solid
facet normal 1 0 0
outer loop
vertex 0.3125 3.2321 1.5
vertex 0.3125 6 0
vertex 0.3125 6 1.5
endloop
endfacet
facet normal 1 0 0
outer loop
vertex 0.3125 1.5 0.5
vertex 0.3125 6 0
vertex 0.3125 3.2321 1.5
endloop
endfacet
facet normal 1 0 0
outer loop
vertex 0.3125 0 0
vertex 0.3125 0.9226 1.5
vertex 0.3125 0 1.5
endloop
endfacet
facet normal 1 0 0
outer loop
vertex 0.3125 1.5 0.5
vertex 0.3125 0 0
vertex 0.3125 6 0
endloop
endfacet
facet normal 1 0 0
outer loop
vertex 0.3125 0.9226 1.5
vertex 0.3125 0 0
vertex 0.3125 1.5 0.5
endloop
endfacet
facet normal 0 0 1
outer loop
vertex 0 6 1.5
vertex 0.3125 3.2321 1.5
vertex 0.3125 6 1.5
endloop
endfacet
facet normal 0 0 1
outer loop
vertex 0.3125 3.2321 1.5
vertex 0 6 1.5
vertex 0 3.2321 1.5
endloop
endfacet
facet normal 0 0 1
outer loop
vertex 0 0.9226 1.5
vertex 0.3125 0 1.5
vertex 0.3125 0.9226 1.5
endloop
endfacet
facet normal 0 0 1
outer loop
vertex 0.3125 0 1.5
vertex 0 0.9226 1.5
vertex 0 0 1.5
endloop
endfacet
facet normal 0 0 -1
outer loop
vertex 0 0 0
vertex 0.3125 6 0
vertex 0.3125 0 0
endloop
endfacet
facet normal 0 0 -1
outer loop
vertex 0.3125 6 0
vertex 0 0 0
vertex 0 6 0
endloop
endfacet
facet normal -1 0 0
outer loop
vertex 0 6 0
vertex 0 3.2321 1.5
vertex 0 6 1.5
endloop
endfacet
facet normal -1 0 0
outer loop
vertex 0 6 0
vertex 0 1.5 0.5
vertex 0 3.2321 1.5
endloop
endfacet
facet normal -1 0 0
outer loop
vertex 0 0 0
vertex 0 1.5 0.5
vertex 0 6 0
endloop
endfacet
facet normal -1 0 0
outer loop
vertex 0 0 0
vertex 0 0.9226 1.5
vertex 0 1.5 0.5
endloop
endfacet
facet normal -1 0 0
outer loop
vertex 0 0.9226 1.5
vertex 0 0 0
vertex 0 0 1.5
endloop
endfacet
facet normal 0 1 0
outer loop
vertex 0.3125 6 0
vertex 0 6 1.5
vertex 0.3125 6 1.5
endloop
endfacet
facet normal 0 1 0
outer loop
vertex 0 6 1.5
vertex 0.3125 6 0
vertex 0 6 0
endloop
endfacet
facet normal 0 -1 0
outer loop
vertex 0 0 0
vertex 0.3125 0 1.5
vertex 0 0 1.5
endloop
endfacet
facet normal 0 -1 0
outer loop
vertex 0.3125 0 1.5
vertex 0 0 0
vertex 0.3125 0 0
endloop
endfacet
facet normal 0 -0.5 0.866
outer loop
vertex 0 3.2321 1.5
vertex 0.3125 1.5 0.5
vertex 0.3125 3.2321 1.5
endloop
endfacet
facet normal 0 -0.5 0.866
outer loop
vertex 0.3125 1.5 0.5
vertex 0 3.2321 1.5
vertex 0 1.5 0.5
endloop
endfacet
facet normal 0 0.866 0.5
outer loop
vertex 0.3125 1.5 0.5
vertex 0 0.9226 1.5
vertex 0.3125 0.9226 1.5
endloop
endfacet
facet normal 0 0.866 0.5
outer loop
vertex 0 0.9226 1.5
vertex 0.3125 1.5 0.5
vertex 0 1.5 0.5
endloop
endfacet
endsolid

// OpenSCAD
/**
* Simple Angle Block Fixture
*
* @file       angle_jig.scad
* @brief      Open SCAD code for a simple angle block fixture
* @author     Jessica Henrich
* @copyright  GNU GPL v3.0 
* @version    0.1
* @date       1/14/2023
*
*
* HOW TO USE:
*
* Load into Open SCAD
*
* Use the parameters to customize the size and angle
* needed.
*
* 1. Height - Defines the overall height
* 2. Length - Defines the overall length
* 3. Width  - Defines the thickness in 16ths/inch
* 4. Step Height - Height of the slope start from the base
* 5. Shoulder Width - Width of the shoulder (use zero for none)
*
*/

// Simple Angle Block

// Height of the block
height = 1.5;

// Length of the block
length = 6.0;

// Block Width in 16ths of an inch
width_in_sixteenths  = 5;

// Angle in degrees
angle  = 30;

// Shoulder Width
sh_width = 1.5;

// Step height
step_height = .5;

width = width_in_sixteenths / 16;

difference()
{
   cube([width,length,height]);
   translate([0,sh_width,step_height])
   {
	rotate([angle,0,0])
	{
         cube([width,length,height]);
	}
   }
	
}
